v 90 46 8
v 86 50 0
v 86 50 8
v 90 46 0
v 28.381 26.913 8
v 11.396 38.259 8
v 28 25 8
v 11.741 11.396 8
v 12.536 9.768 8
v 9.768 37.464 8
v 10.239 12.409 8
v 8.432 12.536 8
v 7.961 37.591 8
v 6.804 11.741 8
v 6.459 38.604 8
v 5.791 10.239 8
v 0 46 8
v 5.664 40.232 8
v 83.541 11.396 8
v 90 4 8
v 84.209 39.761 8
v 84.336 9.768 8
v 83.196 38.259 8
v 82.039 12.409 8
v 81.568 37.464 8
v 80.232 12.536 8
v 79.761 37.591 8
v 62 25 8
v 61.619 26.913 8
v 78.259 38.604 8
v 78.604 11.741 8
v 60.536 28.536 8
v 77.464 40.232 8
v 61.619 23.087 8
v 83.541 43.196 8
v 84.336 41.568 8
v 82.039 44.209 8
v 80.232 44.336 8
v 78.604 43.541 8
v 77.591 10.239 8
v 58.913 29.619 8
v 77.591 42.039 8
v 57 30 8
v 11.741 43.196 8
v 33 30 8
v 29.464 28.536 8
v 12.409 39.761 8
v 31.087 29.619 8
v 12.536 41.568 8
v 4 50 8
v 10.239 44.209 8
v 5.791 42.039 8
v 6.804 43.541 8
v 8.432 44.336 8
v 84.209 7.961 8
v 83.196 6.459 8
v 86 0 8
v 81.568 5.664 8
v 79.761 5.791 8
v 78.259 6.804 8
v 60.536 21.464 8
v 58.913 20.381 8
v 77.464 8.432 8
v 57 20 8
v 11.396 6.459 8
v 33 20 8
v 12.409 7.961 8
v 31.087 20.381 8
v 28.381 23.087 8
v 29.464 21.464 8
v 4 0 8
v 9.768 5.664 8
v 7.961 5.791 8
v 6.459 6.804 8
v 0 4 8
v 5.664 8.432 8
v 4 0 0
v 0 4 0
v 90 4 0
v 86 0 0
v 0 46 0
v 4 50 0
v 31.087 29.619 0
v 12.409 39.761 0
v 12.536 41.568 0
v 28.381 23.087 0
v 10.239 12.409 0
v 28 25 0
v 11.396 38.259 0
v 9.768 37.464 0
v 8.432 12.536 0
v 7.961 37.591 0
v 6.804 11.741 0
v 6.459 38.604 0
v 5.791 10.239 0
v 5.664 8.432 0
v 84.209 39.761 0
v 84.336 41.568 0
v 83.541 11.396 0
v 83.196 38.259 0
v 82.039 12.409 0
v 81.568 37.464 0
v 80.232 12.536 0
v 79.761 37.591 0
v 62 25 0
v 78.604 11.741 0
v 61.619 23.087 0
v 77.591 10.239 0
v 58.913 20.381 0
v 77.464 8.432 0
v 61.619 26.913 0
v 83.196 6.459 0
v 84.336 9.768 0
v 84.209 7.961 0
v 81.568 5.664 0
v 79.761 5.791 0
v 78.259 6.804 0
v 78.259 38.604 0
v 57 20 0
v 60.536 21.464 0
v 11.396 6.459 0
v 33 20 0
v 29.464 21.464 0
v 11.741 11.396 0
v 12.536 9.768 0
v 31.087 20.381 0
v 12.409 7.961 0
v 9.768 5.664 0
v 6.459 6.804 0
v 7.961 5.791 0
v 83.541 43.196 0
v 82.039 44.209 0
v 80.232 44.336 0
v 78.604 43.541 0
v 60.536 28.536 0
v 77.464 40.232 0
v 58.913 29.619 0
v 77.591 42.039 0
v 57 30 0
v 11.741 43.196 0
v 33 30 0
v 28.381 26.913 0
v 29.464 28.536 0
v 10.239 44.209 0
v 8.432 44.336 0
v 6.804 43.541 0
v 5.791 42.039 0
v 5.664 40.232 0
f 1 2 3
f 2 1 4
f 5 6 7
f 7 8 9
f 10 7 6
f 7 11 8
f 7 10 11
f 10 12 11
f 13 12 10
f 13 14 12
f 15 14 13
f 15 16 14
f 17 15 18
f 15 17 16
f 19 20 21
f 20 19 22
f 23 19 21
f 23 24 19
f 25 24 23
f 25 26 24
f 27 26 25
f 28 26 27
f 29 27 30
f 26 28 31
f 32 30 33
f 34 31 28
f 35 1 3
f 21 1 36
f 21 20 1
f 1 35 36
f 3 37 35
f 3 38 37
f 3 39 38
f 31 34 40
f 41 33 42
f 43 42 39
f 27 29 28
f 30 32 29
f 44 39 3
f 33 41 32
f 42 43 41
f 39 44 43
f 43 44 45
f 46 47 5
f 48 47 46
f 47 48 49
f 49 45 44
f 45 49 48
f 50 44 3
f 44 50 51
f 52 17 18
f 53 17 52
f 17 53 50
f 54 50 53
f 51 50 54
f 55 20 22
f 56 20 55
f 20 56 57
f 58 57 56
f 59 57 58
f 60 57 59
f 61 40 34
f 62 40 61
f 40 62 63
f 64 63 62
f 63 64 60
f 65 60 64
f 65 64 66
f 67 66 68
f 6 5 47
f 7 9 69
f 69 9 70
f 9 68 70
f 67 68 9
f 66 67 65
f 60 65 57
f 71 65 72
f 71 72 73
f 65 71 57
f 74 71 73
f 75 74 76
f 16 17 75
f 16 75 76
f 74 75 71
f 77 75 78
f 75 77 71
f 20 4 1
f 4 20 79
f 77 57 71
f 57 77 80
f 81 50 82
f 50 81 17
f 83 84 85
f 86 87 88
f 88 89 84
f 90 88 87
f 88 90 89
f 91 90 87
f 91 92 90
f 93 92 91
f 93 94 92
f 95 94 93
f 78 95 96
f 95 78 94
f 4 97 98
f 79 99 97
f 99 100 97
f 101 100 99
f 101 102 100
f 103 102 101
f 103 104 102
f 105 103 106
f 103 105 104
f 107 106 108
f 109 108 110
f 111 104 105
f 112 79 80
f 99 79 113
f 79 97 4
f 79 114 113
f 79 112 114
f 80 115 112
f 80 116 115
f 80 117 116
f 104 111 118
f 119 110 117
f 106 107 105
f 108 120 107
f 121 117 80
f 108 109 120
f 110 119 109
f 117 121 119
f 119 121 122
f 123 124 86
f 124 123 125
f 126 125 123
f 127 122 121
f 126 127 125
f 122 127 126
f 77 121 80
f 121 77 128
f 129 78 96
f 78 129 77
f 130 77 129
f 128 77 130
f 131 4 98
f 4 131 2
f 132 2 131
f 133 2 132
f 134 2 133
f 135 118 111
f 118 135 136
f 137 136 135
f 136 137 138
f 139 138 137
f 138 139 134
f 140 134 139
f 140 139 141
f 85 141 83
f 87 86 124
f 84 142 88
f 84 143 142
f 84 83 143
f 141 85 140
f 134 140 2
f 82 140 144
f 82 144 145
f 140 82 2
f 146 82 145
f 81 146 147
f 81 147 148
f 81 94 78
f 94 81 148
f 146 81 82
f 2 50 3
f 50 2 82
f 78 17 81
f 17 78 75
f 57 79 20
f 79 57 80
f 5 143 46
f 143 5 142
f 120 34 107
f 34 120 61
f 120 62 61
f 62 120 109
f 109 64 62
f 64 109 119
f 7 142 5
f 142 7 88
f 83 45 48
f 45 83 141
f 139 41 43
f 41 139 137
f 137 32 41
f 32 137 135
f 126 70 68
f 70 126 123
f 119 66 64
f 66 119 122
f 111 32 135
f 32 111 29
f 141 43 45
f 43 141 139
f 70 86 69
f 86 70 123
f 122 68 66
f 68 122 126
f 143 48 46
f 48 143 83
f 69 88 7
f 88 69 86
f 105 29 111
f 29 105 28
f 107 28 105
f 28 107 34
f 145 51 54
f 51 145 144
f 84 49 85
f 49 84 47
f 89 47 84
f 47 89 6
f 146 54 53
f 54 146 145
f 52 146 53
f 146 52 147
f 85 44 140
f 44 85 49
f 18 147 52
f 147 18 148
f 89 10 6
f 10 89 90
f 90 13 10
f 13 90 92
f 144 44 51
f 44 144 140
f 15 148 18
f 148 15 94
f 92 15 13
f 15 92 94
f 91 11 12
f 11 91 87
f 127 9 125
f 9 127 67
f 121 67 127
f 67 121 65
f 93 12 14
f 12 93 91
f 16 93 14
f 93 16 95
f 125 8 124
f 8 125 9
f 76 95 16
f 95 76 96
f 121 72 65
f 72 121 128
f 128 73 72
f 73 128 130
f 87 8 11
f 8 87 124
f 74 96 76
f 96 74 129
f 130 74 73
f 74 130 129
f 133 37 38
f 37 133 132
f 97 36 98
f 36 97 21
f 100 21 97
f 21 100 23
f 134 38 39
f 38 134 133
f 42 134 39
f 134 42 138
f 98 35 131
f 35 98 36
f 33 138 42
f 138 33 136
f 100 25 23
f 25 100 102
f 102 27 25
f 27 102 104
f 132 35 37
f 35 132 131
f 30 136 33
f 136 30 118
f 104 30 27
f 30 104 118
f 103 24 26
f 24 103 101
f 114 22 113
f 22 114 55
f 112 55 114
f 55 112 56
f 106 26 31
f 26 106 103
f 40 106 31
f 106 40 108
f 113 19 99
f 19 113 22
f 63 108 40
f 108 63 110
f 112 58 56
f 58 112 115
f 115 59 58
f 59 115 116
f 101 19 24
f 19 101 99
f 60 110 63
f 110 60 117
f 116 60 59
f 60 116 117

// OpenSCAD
$fn = 32;

// ----------------------------------------------------------------------
// Bracket plate: slot plate 90 x 50
// ----------------------------------------------------------------------

// --- parameters (mm) ---
hole_r = 3.5;             // bolt hole radius
plate_t = 8;              // plate thickness, Z (extrusion height)
plate_l = 90;             // plate length
plate_w = 50;             // plate width
slot_l = 24;              // slot straight length
slot_r = 5;               // slot end radius

slot_len = slot_l + 2 * slot_r;
slot_w = 2 * slot_r;
hole_d2 = 2 * hole_r;

profile = [[4, 0], [86, 0], [90, 4], [90, 46], [86, 50], [4, 50], [0, 46], [0, 4]];  // primary outline, 8 points, counter clockwise
void_1 = [[57, 20], [58.913, 20.381], [60.536, 21.464], [61.619, 23.087], [62, 25], [61.619, 26.913], [60.536, 28.536], [58.913, 29.619], [57, 30], [33, 30], [31.087, 29.619], [29.464, 28.536], [28.381, 26.913], [28, 25], [28.381, 23.087], [29.464, 21.464], [31.087, 20.381], [33, 20]];  // grip slot, 18 points
void_2 = [[12.536, 41.568], [11.741, 43.196], [10.239, 44.209], [8.432, 44.336], [6.804, 43.541], [5.791, 42.039], [5.664, 40.232], [6.459, 38.604], [7.961, 37.591], [9.768, 37.464], [11.396, 38.259], [12.409, 39.761]];  // corner hole, 12 points
void_3 = [[12.536, 9.768], [11.741, 11.396], [10.239, 12.409], [8.432, 12.536], [6.804, 11.741], [5.791, 10.239], [5.664, 8.432], [6.459, 6.804], [7.961, 5.791], [9.768, 5.664], [11.396, 6.459], [12.409, 7.961]];  // corner hole, 12 points
void_4 = [[84.336, 41.568], [83.541, 43.196], [82.039, 44.209], [80.232, 44.336], [78.604, 43.541], [77.591, 42.039], [77.464, 40.232], [78.259, 38.604], [79.761, 37.591], [81.568, 37.464], [83.196, 38.259], [84.209, 39.761]];  // corner hole, 12 points
void_5 = [[84.336, 9.768], [83.541, 11.396], [82.039, 12.409], [80.232, 12.536], [78.604, 11.741], [77.591, 10.239], [77.464, 8.432], [78.259, 6.804], [79.761, 5.791], [81.568, 5.664], [83.196, 6.459], [84.209, 7.961]];  // corner hole, 12 points

// --- the one profile operation ---
difference() {
  linear_extrude(height = plate_t) polygon(points = profile);
  translate([0, 0, -1])
    linear_extrude(height = plate_t + 2) polygon(points = void_1);
  translate([0, 0, -1])
    linear_extrude(height = plate_t + 2) polygon(points = void_2);
  translate([0, 0, -1])
    linear_extrude(height = plate_t + 2) polygon(points = void_3);
  translate([0, 0, -1])
    linear_extrude(height = plate_t + 2) polygon(points = void_4);
  translate([0, 0, -1])
    linear_extrude(height = plate_t + 2) polygon(points = void_5);
}
